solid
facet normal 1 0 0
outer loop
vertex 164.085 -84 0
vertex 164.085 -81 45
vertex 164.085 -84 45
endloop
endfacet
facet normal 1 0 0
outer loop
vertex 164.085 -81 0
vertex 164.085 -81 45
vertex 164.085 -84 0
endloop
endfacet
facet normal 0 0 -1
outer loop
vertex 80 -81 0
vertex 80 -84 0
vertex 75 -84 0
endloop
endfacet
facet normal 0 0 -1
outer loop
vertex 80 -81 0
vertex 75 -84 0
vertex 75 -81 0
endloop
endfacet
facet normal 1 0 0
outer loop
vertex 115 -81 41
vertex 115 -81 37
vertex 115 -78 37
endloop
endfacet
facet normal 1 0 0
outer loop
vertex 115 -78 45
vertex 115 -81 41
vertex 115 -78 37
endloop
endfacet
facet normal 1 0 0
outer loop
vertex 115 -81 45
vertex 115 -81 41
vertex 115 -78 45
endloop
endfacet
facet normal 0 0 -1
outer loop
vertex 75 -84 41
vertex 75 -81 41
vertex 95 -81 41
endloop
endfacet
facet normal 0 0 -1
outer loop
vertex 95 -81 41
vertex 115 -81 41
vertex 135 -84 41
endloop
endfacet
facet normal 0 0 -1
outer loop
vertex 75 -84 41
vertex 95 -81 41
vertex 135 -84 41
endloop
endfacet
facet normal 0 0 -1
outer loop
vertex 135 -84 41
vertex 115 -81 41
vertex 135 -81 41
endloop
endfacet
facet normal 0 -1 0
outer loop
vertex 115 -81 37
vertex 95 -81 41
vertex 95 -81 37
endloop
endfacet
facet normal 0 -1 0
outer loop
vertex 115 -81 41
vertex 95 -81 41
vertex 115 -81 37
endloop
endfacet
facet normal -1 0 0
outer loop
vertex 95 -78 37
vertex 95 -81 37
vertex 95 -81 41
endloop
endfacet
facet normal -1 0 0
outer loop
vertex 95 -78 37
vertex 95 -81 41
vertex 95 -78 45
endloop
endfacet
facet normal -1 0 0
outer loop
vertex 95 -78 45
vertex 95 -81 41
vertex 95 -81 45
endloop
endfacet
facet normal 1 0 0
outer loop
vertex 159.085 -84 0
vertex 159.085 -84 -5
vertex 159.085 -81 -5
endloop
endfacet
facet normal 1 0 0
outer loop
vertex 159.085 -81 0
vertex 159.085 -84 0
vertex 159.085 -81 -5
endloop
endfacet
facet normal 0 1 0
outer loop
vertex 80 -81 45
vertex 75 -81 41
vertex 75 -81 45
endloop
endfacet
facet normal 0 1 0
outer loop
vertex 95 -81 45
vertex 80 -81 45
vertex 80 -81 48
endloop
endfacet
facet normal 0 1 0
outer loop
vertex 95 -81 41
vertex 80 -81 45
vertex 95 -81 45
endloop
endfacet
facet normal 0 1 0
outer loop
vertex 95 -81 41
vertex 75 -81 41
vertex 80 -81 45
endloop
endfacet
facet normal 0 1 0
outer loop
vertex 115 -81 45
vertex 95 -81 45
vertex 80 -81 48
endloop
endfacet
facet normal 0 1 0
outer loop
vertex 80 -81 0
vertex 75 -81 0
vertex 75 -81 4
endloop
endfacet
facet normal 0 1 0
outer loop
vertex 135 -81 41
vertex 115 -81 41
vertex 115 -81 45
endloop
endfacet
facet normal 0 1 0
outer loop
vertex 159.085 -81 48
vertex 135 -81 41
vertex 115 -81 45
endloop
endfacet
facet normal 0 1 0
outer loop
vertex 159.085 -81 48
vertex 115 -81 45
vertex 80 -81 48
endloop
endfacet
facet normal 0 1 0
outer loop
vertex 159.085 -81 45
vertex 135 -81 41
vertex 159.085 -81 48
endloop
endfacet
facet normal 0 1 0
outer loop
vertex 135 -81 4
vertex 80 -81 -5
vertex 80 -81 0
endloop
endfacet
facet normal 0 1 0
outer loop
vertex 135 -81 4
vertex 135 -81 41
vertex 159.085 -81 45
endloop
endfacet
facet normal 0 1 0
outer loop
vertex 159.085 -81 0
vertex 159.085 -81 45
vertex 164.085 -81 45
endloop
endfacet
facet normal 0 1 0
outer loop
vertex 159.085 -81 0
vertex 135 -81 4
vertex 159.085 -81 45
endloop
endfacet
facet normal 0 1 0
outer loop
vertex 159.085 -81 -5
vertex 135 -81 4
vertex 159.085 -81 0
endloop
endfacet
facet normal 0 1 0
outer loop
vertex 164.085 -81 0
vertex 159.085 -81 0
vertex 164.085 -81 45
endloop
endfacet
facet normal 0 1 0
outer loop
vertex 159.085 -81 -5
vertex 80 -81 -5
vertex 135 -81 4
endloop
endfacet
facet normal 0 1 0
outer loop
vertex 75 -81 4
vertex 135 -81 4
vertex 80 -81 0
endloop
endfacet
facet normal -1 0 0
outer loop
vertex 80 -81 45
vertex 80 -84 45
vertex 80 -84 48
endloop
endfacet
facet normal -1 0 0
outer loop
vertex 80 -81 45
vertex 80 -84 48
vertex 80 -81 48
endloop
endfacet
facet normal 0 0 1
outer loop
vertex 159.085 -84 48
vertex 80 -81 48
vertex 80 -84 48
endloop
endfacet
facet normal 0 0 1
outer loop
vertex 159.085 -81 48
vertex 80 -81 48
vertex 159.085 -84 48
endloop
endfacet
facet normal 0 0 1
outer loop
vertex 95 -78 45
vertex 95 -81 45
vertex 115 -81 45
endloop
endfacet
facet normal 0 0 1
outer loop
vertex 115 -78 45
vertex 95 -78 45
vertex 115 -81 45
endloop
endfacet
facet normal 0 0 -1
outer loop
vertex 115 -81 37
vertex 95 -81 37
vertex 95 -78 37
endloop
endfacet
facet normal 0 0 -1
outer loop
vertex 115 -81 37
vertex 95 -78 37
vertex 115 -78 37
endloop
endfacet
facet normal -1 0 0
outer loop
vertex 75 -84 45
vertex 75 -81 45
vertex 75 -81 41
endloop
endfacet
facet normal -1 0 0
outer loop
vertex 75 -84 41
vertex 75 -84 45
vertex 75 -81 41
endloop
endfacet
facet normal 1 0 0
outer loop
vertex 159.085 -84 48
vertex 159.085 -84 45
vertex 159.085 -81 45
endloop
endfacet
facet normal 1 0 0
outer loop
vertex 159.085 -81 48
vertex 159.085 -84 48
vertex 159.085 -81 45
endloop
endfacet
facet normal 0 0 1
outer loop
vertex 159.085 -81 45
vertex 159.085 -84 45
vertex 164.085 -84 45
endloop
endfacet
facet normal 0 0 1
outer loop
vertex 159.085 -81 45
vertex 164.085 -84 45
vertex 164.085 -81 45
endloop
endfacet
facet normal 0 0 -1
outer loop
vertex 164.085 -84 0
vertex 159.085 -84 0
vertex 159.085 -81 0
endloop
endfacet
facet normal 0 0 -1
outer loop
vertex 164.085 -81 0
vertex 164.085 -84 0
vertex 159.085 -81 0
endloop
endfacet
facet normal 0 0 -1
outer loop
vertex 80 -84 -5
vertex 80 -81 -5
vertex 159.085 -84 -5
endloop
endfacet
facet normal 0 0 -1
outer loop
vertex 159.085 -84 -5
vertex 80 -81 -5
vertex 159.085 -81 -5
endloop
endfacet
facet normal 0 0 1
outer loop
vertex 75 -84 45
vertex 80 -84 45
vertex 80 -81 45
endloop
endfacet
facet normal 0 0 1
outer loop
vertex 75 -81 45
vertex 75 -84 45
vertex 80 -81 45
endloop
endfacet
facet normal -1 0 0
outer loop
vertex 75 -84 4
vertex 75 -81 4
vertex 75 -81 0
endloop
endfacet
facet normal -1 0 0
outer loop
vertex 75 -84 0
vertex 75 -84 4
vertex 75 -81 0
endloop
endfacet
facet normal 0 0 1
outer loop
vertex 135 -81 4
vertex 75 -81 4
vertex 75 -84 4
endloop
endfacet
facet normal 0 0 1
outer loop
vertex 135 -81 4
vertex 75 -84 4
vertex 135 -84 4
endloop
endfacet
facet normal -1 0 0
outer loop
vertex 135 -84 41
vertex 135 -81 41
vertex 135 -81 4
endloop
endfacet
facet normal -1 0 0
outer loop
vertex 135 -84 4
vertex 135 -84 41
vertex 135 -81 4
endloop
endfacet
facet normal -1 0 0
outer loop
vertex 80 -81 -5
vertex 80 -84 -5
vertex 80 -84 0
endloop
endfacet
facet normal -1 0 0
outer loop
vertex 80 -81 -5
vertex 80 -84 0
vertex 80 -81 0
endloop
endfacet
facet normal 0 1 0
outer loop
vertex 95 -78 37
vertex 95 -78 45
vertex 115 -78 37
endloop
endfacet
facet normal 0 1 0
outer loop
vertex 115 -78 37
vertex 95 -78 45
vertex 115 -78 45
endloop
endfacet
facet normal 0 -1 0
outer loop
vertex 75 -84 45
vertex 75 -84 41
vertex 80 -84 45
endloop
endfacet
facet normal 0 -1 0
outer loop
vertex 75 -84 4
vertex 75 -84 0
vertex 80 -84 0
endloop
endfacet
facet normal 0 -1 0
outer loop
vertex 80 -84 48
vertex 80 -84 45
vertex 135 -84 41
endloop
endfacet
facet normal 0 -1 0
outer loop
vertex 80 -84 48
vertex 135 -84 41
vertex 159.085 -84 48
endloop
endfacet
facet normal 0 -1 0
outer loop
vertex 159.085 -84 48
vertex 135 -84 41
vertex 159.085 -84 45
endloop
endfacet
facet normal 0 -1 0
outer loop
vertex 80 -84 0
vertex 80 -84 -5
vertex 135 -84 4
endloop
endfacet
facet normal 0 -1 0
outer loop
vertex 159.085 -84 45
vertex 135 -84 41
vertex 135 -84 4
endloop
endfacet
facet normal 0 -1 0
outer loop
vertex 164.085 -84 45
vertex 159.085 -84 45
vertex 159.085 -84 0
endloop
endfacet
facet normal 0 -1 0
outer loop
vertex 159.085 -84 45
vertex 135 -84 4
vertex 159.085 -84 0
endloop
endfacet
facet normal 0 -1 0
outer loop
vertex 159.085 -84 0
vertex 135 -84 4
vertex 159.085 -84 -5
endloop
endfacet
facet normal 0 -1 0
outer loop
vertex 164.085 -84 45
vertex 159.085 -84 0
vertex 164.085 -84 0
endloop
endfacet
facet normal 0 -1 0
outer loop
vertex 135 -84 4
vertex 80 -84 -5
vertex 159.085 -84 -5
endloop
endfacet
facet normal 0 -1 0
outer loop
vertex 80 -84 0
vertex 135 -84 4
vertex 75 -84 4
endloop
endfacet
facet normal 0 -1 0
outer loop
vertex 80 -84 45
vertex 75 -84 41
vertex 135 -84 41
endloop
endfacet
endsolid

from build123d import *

# Parameters (mm, degrees)
ESTRUSIONE_ESTRUSIONE1_DEPTH      = 48
ESTRUSIONE_ESTRUSIONE1_DEPTH_BACK = 5
SCHIZZO1_W                        = 79.084596206
SCHIZZO1_H                        = 3
SCHIZZO2_W                        = 45
SCHIZZO2_H                        = 3
ESTRUSIONE_ESTRUSIONE2_DEPTH      = 5
SCHIZZO3_W                        = 60
SCHIZZO3_H                        = 37
TAGLIO_ESTRUSIONE1_DEPTH          = 10
SCHIZZO4_W                        = 20
SCHIZZO4_H                        = 8
ESTRUSIONE_ESTRUSIONE3_DEPTH      = 3


with BuildPart() as part:
    # Schizzo1 → Estrusione-Estrusione1 (new, two sides: drawn at the far end of the back side and taken through both)
    with BuildSketch(Plane.XY.offset(-ESTRUSIONE_ESTRUSIONE1_DEPTH_BACK)):
        with Locations((119.542298103, -82.5)):
            Rectangle(SCHIZZO1_W, SCHIZZO1_H)
    extrude(amount=ESTRUSIONE_ESTRUSIONE1_DEPTH + ESTRUSIONE_ESTRUSIONE1_DEPTH_BACK)

    # Schizzo2 → Estrusione-Estrusione2 (add)
    with BuildSketch(Plane(origin=(159.084596206, 0, 0), x_dir=(0, 0, -1), z_dir=(1, 0, 0))):
        with Locations((-22.5, -82.5)):
            Rectangle(SCHIZZO2_W, SCHIZZO2_H)
    estrusione_estrusione2 = extrude(amount=ESTRUSIONE_ESTRUSIONE2_DEPTH)

    # Specchia1: Estrusione-Estrusione2 across plane
    add(estrusione_estrusione2.mirror(Plane(origin=(119.542298103, 0, 0), x_dir=(0, 0, 1), z_dir=(1, 0, 0))))

    # Schizzo3 → Taglio-Estrusione1 (cut)
    with BuildSketch(Plane(origin=(0, -81, 0), x_dir=(1, 0, 0), z_dir=(0, 1, 0))):
        with Locations((105, -22.5)):
            Rectangle(SCHIZZO3_W, SCHIZZO3_H)
    extrude(amount=-TAGLIO_ESTRUSIONE1_DEPTH, mode=Mode.SUBTRACT)

    # Schizzo4 → Estrusione-Estrusione3 (add)
    with BuildSketch(Plane.XZ.offset(81)):
        with Locations((105, 41)):
            Rectangle(SCHIZZO4_W, SCHIZZO4_H)
    extrude(amount=-ESTRUSIONE_ESTRUSIONE3_DEPTH)


solid = part.part
